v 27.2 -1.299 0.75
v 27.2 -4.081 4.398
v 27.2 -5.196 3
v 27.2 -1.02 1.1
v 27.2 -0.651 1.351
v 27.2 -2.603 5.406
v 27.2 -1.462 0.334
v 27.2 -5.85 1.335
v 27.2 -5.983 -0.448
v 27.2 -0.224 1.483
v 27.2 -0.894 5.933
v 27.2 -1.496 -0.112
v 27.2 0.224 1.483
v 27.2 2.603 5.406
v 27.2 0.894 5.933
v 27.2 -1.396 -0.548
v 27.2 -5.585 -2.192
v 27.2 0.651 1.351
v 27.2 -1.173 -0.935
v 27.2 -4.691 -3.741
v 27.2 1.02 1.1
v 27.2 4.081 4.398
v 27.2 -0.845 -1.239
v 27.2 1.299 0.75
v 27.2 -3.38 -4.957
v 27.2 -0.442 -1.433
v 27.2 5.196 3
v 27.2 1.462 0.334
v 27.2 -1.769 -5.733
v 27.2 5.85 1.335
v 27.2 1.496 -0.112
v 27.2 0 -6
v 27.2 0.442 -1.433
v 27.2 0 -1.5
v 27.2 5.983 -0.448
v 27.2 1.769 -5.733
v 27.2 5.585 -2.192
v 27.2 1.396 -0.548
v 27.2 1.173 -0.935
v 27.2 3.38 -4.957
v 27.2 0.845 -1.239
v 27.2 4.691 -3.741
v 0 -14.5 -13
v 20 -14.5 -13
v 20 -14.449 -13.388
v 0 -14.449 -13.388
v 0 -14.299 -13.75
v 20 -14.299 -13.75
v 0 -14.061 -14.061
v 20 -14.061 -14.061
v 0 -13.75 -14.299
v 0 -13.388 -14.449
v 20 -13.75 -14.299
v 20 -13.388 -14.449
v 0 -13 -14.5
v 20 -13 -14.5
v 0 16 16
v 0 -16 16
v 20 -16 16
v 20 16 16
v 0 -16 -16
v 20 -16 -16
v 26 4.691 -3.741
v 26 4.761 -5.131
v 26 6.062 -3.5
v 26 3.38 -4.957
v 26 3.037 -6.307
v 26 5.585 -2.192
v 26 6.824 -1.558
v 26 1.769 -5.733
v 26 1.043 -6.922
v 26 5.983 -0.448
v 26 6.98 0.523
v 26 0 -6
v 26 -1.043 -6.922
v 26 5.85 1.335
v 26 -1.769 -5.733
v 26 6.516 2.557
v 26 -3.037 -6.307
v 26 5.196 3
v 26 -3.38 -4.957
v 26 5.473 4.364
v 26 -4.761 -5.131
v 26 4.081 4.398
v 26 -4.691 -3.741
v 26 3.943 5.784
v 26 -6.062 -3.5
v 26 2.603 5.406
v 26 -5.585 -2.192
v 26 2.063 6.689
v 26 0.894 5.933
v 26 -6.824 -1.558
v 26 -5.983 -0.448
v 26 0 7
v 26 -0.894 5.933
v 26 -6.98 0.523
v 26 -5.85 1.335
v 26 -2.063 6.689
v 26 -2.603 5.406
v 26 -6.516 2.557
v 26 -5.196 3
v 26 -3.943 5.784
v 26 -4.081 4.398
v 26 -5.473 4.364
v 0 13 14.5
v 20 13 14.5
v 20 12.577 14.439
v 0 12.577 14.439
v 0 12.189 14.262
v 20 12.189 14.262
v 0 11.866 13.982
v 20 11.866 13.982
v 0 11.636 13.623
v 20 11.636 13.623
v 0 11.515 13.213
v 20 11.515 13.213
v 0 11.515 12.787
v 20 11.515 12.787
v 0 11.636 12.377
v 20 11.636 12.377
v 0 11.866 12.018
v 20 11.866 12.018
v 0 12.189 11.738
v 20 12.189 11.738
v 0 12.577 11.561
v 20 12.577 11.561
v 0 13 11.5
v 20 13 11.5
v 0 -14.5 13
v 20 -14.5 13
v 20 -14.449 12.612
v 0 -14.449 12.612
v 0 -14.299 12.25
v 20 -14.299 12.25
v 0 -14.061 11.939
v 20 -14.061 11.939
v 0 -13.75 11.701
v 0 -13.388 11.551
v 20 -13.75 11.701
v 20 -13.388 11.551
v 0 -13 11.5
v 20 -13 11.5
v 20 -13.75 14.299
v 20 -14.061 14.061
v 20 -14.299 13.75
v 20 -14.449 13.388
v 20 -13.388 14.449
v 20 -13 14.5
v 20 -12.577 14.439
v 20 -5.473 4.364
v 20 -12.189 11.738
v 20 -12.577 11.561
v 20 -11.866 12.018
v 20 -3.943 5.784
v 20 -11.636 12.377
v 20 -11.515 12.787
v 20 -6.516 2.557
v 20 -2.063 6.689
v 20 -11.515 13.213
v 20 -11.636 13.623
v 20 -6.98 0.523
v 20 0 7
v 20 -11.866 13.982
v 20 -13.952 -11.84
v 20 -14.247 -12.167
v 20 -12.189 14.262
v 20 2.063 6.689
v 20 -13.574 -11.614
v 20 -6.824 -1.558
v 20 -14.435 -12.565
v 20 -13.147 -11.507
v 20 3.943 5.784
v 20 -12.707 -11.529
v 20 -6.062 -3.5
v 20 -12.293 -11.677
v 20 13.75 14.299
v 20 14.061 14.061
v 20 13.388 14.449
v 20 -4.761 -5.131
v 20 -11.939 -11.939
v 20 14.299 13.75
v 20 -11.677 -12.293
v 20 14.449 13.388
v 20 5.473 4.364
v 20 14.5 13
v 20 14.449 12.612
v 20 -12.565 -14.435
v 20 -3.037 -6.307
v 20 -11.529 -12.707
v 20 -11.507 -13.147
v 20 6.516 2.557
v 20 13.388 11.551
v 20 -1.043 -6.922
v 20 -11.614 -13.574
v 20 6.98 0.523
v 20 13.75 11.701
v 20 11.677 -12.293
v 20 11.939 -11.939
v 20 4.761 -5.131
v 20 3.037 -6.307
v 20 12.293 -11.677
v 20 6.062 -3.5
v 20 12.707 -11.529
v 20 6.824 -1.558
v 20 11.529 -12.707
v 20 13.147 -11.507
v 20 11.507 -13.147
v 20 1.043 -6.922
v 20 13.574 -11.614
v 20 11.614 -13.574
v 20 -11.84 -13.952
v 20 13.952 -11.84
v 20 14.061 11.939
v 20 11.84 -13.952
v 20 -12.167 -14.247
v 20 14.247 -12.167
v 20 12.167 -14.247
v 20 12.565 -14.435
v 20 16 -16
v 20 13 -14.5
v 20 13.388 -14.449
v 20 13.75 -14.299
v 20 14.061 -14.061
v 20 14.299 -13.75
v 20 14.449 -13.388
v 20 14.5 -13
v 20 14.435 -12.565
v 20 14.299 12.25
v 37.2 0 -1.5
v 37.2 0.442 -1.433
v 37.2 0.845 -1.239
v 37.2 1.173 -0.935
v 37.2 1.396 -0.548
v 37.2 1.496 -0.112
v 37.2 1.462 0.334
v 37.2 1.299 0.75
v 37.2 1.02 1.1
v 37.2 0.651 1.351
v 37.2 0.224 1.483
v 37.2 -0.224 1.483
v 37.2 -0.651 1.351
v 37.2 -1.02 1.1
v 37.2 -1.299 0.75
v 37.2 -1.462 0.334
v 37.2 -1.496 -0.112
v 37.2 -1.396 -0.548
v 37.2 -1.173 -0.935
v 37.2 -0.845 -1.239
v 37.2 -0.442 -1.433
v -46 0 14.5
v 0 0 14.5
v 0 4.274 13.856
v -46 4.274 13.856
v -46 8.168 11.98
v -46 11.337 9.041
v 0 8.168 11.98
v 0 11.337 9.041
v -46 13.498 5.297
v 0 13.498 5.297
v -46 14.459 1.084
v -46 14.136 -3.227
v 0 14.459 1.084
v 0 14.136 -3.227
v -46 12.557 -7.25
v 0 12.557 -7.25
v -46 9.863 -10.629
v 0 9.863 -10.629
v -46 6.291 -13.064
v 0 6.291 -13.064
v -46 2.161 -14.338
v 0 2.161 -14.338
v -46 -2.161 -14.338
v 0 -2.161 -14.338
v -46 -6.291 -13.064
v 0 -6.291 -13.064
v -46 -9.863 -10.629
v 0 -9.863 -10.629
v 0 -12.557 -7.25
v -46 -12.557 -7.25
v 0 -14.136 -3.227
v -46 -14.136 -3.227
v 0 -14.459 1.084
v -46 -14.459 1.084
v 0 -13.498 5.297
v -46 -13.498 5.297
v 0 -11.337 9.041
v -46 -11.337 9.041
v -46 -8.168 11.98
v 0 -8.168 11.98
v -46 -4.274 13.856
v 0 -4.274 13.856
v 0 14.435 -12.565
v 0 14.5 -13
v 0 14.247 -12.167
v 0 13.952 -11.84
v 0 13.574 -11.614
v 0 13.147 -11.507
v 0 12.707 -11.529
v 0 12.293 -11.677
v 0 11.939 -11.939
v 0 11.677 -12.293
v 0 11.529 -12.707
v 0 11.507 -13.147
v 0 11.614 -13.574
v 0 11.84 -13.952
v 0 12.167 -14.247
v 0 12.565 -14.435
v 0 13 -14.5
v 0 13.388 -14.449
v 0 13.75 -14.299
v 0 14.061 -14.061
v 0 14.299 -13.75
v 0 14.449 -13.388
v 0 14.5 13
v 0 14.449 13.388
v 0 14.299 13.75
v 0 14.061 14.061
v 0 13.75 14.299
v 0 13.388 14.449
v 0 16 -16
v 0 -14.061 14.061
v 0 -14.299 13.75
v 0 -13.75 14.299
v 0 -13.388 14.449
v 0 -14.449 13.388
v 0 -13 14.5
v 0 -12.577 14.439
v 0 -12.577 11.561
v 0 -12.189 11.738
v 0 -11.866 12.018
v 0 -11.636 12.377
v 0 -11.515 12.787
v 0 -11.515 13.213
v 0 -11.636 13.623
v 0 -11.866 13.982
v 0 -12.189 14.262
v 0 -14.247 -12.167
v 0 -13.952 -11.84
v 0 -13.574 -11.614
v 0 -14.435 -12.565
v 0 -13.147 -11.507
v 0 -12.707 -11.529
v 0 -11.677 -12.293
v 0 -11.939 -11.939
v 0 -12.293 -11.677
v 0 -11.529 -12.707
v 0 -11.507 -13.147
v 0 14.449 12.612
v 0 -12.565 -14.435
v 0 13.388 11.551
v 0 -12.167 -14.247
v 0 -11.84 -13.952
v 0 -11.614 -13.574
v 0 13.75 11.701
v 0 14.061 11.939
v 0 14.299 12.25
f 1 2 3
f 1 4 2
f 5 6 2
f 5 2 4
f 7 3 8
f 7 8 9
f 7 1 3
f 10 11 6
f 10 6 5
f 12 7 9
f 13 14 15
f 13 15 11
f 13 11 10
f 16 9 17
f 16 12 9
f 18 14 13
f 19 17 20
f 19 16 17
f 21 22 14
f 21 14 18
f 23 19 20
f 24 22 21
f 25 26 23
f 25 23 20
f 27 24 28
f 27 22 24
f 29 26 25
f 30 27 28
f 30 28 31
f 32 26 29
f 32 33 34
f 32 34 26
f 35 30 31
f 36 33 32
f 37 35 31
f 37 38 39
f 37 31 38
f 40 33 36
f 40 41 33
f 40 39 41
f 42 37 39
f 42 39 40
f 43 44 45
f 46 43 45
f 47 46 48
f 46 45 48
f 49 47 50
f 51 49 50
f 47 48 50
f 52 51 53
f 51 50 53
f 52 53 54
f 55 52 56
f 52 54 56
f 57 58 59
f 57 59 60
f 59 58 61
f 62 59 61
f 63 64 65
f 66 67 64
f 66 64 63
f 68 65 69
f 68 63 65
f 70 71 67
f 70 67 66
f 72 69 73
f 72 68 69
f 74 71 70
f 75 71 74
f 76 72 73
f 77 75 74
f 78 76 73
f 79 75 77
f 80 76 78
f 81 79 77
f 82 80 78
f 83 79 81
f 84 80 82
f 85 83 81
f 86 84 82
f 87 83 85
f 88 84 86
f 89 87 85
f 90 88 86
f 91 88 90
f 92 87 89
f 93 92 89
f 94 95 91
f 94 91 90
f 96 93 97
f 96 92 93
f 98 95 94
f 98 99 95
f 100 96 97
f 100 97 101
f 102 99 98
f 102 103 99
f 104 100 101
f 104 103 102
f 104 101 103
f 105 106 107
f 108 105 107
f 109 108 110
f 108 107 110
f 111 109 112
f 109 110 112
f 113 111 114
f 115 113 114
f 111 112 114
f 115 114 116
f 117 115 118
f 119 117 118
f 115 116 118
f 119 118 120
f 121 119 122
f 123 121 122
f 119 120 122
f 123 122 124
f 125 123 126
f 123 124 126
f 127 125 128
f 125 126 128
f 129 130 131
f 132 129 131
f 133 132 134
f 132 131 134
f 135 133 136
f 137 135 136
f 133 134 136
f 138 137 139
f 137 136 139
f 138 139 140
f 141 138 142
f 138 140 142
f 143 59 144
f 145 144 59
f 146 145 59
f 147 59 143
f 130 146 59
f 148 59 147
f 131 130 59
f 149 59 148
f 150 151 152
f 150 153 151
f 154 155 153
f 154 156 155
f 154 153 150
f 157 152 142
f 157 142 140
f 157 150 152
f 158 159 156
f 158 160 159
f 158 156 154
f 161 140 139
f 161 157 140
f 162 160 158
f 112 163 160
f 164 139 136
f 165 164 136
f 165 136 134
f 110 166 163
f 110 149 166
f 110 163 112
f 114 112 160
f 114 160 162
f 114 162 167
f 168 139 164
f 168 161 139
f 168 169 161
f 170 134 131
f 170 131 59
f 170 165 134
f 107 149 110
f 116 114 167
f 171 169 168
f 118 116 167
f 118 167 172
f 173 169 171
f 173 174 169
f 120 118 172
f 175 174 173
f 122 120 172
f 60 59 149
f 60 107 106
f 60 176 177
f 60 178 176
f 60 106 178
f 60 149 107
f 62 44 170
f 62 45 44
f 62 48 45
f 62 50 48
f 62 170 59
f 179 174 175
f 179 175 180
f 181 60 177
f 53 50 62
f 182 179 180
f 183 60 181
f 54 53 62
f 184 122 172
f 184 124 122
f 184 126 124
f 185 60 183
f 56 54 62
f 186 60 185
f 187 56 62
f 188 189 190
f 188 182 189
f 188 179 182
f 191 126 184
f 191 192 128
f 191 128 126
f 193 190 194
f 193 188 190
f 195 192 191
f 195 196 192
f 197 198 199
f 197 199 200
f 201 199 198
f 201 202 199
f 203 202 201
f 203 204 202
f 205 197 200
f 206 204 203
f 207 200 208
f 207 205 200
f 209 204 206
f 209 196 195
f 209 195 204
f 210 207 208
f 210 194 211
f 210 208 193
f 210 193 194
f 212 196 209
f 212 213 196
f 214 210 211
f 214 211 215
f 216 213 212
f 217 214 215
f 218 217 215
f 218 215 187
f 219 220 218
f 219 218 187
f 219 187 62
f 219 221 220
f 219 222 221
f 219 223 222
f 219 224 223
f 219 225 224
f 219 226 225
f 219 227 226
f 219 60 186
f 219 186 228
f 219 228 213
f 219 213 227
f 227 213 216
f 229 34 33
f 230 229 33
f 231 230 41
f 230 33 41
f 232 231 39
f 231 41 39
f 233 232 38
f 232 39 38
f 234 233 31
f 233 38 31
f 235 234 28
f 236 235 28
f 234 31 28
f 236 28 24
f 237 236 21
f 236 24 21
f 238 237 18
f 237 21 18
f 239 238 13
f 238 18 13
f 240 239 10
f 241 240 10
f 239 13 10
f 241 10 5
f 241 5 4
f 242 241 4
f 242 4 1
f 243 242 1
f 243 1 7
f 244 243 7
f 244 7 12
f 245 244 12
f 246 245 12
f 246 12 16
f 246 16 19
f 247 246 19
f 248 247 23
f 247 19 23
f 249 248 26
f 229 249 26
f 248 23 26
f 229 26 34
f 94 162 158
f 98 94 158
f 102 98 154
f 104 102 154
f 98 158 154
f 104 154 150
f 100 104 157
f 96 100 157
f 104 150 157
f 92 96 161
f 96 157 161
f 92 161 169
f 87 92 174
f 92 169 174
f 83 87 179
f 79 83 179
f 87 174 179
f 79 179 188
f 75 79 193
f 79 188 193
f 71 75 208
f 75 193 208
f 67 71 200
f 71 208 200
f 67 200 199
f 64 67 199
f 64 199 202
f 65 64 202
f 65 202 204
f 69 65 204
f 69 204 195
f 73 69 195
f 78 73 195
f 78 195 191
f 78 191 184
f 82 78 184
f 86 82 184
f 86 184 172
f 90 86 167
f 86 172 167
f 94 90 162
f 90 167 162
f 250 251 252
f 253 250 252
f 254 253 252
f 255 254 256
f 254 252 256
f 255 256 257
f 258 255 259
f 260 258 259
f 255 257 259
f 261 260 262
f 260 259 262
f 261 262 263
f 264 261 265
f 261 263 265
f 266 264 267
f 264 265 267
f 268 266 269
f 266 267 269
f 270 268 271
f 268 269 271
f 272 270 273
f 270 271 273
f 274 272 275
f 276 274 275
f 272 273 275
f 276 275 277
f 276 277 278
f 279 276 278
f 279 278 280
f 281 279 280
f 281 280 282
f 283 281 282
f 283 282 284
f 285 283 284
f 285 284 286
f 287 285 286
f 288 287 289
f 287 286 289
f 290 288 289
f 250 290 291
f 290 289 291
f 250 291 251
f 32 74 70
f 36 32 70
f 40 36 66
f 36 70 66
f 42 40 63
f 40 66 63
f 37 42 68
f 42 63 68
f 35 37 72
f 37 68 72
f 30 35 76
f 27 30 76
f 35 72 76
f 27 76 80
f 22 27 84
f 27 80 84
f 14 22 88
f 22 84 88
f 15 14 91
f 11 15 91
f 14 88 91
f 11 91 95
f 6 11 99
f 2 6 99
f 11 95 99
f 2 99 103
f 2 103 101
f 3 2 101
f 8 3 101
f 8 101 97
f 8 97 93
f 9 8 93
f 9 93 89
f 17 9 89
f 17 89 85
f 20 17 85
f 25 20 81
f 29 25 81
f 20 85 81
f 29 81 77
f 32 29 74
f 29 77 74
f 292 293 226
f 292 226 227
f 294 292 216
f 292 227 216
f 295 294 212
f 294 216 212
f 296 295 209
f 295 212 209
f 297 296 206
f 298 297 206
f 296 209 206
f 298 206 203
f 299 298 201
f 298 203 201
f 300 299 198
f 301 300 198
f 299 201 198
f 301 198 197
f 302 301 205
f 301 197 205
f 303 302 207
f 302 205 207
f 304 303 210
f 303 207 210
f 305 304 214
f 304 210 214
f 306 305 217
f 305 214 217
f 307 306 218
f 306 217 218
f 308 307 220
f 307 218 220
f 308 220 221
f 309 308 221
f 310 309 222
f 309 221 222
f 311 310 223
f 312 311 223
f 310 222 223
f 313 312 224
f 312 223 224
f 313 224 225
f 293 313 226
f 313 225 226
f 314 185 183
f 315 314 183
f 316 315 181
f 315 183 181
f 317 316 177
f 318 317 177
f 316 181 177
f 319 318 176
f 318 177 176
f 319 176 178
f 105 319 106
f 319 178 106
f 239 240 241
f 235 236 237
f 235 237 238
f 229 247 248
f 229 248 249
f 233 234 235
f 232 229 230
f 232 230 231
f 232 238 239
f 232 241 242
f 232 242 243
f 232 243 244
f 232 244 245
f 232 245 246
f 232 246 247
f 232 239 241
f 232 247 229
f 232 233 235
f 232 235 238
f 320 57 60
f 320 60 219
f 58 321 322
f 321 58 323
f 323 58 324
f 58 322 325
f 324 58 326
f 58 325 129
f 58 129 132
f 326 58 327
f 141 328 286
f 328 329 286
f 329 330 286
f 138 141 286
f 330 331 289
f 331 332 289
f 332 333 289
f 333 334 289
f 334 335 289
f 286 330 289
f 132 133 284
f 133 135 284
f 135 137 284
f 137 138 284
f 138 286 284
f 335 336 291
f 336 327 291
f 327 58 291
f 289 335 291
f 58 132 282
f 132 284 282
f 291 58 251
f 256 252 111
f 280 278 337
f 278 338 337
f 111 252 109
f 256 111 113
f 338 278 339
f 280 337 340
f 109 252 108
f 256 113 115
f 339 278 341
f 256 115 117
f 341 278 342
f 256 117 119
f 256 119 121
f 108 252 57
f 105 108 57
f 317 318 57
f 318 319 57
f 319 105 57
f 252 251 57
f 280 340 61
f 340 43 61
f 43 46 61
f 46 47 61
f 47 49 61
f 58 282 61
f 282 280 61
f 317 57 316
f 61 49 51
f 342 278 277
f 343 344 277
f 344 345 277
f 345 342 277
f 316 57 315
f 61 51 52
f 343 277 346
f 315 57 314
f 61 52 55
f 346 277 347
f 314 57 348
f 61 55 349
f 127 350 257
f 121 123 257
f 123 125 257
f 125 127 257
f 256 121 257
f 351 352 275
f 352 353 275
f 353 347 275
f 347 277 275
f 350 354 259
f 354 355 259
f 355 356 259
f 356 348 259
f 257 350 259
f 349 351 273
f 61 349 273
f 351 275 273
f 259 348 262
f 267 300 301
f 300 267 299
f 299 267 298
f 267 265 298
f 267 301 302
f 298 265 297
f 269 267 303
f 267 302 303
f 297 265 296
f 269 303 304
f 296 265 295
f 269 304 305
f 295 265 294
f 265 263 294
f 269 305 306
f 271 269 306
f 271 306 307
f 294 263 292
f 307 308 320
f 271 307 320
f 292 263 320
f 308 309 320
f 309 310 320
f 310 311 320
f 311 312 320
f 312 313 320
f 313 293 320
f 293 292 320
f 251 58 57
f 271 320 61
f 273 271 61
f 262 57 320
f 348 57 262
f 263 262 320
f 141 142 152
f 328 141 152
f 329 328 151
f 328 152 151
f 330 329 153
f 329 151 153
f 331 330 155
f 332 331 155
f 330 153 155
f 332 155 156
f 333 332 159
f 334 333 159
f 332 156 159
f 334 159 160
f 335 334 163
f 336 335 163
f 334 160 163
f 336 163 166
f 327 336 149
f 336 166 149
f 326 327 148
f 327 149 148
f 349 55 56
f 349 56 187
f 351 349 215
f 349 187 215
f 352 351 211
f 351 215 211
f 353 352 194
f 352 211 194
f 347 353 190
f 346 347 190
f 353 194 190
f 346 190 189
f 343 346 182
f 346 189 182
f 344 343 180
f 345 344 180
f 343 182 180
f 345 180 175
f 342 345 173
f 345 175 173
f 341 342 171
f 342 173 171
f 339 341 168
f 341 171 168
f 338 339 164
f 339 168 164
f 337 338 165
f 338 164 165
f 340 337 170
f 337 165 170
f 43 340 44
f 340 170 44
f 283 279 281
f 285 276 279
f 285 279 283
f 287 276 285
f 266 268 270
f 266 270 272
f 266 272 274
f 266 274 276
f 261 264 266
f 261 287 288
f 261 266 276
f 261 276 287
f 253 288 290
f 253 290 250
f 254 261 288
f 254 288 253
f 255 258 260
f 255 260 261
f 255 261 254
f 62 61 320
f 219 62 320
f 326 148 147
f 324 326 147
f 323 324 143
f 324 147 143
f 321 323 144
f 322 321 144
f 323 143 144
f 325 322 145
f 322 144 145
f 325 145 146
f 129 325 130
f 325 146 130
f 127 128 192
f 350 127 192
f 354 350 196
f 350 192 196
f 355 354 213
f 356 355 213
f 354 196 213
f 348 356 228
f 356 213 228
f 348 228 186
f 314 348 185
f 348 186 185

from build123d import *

# Parameters (mm, degrees)
SKETCH1_W           = 32
SKETCH1_H           = 32
BOSS_EXTRUDE2_DEPTH = 20
SKETCH2_R           = 14.5
BOSS_EXTRUDE3_DEPTH = 46
SKETCH3_R           = 7
BOSS_EXTRUDE4_DEPTH = 6
SKETCH6_R           = 6
BOSS_EXTRUDE5_DEPTH = 1.2
SKETCH7_R           = 1.5
BOSS_EXTRUDE6_DEPTH = 10
CUT_EXTRUDE5_DEPTH  = 20


with BuildPart() as part:
    # Sketch1 → Boss-Extrude2 (new body)
    with BuildSketch(Plane(origin=(0, 0, 0), x_dir=(0, 0, -1), z_dir=(1, 0, 0))):
        Rectangle(SKETCH1_W, SKETCH1_H)
    extrude(amount=BOSS_EXTRUDE2_DEPTH)

    # Sketch2 → Boss-Extrude3 (add)
    with BuildSketch(Plane.ZY):
        Circle(SKETCH2_R)
    extrude(amount=BOSS_EXTRUDE3_DEPTH)

    # Sketch3 → Boss-Extrude4 (add)
    with BuildSketch(Plane(origin=(20, 0, 0), x_dir=(0, 0, -1), z_dir=(1, 0, 0))):
        with Locations(Location((0, 0, 0), (0, 0, 180))):
            Circle(SKETCH3_R)
    extrude(amount=BOSS_EXTRUDE4_DEPTH)

    # Sketch6 → Boss-Extrude5 (add)
    with BuildSketch(Plane(origin=(26, 0, 0), x_dir=(0, 0, -1), z_dir=(1, 0, 0))):
        Circle(SKETCH6_R)
    extrude(amount=BOSS_EXTRUDE5_DEPTH)

    # Sketch7 → Boss-Extrude6 (add)
    with BuildSketch(Plane(origin=(27.2, 0, 0), x_dir=(0, 0, -1), z_dir=(1, 0, 0))):
        Circle(SKETCH7_R)
    extrude(amount=BOSS_EXTRUDE6_DEPTH)

    # Sketch8 → Cut-Extrude5 (cut)
    with BuildSketch(Plane(origin=(20, 0, 0), x_dir=(0, 0, -1), z_dir=(1, 0, 0))):
        with BuildLine():
            ThreePointArc((-14.5, -13), (-14.060660172, -14.060660172), (-13, -14.5))
            Line((-13, -14.5), (-13, -13))
            Line((-13, -13), (-14.5, -13))
        make_face()
        with BuildLine():
            Line((-13, -13), (-13, -14.5))
            ThreePointArc((-13, -14.5), (-11.939339828, -14.060660172), (-11.5, -13))
            ThreePointArc((-11.5, -13), (-13, -11.5), (-14.5, -13))
            Line((-14.5, -13), (-13, -13))
        make_face()
        with BuildLine():
            ThreePointArc((14.5, -13), (11.939339828, -11.939339828), (13, -14.5))
            Line((13, -14.5), (13, -13))
            Line((13, -13), (14.5, -13))
        make_face()
        with BuildLine():
            Line((13, -13), (13, -14.5))
            ThreePointArc((13, -14.5), (14.060660172, -14.060660172), (14.5, -13))
            Line((14.5, -13), (13, -13))
        make_face()
        with BuildLine():
            ThreePointArc((14.5, 13), (14.060660172, 14.060660172), (13, 14.5))
            Line((13, 14.5), (13, 13))
            Line((13, 13), (14.5, 13))
        make_face()
        with BuildLine():
            Line((13, 13), (13, 14.5))
            ThreePointArc((13, 14.5), (11.939339828, 11.939339828), (14.5, 13))
            Line((14.5, 13), (13, 13))
        make_face()
        with BuildLine():
            ThreePointArc((-11.5, 13), (-11.939339828, 14.060660172), (-13, 14.5))
            Line((-13, 14.5), (-13, 13))
            Line((-13, 13), (-14.5, 13))
            ThreePointArc((-14.5, 13), (-13, 11.5), (-11.5, 13))
        make_face()
        with BuildLine():
            Line((-13, 13), (-13, 14.5))
            ThreePointArc((-13, 14.5), (-14.060660172, 14.060660172), (-14.5, 13))
            Line((-14.5, 13), (-13, 13))
        make_face()
    extrude(amount=-CUT_EXTRUDE5_DEPTH, mode=Mode.SUBTRACT)


solid = part.part
